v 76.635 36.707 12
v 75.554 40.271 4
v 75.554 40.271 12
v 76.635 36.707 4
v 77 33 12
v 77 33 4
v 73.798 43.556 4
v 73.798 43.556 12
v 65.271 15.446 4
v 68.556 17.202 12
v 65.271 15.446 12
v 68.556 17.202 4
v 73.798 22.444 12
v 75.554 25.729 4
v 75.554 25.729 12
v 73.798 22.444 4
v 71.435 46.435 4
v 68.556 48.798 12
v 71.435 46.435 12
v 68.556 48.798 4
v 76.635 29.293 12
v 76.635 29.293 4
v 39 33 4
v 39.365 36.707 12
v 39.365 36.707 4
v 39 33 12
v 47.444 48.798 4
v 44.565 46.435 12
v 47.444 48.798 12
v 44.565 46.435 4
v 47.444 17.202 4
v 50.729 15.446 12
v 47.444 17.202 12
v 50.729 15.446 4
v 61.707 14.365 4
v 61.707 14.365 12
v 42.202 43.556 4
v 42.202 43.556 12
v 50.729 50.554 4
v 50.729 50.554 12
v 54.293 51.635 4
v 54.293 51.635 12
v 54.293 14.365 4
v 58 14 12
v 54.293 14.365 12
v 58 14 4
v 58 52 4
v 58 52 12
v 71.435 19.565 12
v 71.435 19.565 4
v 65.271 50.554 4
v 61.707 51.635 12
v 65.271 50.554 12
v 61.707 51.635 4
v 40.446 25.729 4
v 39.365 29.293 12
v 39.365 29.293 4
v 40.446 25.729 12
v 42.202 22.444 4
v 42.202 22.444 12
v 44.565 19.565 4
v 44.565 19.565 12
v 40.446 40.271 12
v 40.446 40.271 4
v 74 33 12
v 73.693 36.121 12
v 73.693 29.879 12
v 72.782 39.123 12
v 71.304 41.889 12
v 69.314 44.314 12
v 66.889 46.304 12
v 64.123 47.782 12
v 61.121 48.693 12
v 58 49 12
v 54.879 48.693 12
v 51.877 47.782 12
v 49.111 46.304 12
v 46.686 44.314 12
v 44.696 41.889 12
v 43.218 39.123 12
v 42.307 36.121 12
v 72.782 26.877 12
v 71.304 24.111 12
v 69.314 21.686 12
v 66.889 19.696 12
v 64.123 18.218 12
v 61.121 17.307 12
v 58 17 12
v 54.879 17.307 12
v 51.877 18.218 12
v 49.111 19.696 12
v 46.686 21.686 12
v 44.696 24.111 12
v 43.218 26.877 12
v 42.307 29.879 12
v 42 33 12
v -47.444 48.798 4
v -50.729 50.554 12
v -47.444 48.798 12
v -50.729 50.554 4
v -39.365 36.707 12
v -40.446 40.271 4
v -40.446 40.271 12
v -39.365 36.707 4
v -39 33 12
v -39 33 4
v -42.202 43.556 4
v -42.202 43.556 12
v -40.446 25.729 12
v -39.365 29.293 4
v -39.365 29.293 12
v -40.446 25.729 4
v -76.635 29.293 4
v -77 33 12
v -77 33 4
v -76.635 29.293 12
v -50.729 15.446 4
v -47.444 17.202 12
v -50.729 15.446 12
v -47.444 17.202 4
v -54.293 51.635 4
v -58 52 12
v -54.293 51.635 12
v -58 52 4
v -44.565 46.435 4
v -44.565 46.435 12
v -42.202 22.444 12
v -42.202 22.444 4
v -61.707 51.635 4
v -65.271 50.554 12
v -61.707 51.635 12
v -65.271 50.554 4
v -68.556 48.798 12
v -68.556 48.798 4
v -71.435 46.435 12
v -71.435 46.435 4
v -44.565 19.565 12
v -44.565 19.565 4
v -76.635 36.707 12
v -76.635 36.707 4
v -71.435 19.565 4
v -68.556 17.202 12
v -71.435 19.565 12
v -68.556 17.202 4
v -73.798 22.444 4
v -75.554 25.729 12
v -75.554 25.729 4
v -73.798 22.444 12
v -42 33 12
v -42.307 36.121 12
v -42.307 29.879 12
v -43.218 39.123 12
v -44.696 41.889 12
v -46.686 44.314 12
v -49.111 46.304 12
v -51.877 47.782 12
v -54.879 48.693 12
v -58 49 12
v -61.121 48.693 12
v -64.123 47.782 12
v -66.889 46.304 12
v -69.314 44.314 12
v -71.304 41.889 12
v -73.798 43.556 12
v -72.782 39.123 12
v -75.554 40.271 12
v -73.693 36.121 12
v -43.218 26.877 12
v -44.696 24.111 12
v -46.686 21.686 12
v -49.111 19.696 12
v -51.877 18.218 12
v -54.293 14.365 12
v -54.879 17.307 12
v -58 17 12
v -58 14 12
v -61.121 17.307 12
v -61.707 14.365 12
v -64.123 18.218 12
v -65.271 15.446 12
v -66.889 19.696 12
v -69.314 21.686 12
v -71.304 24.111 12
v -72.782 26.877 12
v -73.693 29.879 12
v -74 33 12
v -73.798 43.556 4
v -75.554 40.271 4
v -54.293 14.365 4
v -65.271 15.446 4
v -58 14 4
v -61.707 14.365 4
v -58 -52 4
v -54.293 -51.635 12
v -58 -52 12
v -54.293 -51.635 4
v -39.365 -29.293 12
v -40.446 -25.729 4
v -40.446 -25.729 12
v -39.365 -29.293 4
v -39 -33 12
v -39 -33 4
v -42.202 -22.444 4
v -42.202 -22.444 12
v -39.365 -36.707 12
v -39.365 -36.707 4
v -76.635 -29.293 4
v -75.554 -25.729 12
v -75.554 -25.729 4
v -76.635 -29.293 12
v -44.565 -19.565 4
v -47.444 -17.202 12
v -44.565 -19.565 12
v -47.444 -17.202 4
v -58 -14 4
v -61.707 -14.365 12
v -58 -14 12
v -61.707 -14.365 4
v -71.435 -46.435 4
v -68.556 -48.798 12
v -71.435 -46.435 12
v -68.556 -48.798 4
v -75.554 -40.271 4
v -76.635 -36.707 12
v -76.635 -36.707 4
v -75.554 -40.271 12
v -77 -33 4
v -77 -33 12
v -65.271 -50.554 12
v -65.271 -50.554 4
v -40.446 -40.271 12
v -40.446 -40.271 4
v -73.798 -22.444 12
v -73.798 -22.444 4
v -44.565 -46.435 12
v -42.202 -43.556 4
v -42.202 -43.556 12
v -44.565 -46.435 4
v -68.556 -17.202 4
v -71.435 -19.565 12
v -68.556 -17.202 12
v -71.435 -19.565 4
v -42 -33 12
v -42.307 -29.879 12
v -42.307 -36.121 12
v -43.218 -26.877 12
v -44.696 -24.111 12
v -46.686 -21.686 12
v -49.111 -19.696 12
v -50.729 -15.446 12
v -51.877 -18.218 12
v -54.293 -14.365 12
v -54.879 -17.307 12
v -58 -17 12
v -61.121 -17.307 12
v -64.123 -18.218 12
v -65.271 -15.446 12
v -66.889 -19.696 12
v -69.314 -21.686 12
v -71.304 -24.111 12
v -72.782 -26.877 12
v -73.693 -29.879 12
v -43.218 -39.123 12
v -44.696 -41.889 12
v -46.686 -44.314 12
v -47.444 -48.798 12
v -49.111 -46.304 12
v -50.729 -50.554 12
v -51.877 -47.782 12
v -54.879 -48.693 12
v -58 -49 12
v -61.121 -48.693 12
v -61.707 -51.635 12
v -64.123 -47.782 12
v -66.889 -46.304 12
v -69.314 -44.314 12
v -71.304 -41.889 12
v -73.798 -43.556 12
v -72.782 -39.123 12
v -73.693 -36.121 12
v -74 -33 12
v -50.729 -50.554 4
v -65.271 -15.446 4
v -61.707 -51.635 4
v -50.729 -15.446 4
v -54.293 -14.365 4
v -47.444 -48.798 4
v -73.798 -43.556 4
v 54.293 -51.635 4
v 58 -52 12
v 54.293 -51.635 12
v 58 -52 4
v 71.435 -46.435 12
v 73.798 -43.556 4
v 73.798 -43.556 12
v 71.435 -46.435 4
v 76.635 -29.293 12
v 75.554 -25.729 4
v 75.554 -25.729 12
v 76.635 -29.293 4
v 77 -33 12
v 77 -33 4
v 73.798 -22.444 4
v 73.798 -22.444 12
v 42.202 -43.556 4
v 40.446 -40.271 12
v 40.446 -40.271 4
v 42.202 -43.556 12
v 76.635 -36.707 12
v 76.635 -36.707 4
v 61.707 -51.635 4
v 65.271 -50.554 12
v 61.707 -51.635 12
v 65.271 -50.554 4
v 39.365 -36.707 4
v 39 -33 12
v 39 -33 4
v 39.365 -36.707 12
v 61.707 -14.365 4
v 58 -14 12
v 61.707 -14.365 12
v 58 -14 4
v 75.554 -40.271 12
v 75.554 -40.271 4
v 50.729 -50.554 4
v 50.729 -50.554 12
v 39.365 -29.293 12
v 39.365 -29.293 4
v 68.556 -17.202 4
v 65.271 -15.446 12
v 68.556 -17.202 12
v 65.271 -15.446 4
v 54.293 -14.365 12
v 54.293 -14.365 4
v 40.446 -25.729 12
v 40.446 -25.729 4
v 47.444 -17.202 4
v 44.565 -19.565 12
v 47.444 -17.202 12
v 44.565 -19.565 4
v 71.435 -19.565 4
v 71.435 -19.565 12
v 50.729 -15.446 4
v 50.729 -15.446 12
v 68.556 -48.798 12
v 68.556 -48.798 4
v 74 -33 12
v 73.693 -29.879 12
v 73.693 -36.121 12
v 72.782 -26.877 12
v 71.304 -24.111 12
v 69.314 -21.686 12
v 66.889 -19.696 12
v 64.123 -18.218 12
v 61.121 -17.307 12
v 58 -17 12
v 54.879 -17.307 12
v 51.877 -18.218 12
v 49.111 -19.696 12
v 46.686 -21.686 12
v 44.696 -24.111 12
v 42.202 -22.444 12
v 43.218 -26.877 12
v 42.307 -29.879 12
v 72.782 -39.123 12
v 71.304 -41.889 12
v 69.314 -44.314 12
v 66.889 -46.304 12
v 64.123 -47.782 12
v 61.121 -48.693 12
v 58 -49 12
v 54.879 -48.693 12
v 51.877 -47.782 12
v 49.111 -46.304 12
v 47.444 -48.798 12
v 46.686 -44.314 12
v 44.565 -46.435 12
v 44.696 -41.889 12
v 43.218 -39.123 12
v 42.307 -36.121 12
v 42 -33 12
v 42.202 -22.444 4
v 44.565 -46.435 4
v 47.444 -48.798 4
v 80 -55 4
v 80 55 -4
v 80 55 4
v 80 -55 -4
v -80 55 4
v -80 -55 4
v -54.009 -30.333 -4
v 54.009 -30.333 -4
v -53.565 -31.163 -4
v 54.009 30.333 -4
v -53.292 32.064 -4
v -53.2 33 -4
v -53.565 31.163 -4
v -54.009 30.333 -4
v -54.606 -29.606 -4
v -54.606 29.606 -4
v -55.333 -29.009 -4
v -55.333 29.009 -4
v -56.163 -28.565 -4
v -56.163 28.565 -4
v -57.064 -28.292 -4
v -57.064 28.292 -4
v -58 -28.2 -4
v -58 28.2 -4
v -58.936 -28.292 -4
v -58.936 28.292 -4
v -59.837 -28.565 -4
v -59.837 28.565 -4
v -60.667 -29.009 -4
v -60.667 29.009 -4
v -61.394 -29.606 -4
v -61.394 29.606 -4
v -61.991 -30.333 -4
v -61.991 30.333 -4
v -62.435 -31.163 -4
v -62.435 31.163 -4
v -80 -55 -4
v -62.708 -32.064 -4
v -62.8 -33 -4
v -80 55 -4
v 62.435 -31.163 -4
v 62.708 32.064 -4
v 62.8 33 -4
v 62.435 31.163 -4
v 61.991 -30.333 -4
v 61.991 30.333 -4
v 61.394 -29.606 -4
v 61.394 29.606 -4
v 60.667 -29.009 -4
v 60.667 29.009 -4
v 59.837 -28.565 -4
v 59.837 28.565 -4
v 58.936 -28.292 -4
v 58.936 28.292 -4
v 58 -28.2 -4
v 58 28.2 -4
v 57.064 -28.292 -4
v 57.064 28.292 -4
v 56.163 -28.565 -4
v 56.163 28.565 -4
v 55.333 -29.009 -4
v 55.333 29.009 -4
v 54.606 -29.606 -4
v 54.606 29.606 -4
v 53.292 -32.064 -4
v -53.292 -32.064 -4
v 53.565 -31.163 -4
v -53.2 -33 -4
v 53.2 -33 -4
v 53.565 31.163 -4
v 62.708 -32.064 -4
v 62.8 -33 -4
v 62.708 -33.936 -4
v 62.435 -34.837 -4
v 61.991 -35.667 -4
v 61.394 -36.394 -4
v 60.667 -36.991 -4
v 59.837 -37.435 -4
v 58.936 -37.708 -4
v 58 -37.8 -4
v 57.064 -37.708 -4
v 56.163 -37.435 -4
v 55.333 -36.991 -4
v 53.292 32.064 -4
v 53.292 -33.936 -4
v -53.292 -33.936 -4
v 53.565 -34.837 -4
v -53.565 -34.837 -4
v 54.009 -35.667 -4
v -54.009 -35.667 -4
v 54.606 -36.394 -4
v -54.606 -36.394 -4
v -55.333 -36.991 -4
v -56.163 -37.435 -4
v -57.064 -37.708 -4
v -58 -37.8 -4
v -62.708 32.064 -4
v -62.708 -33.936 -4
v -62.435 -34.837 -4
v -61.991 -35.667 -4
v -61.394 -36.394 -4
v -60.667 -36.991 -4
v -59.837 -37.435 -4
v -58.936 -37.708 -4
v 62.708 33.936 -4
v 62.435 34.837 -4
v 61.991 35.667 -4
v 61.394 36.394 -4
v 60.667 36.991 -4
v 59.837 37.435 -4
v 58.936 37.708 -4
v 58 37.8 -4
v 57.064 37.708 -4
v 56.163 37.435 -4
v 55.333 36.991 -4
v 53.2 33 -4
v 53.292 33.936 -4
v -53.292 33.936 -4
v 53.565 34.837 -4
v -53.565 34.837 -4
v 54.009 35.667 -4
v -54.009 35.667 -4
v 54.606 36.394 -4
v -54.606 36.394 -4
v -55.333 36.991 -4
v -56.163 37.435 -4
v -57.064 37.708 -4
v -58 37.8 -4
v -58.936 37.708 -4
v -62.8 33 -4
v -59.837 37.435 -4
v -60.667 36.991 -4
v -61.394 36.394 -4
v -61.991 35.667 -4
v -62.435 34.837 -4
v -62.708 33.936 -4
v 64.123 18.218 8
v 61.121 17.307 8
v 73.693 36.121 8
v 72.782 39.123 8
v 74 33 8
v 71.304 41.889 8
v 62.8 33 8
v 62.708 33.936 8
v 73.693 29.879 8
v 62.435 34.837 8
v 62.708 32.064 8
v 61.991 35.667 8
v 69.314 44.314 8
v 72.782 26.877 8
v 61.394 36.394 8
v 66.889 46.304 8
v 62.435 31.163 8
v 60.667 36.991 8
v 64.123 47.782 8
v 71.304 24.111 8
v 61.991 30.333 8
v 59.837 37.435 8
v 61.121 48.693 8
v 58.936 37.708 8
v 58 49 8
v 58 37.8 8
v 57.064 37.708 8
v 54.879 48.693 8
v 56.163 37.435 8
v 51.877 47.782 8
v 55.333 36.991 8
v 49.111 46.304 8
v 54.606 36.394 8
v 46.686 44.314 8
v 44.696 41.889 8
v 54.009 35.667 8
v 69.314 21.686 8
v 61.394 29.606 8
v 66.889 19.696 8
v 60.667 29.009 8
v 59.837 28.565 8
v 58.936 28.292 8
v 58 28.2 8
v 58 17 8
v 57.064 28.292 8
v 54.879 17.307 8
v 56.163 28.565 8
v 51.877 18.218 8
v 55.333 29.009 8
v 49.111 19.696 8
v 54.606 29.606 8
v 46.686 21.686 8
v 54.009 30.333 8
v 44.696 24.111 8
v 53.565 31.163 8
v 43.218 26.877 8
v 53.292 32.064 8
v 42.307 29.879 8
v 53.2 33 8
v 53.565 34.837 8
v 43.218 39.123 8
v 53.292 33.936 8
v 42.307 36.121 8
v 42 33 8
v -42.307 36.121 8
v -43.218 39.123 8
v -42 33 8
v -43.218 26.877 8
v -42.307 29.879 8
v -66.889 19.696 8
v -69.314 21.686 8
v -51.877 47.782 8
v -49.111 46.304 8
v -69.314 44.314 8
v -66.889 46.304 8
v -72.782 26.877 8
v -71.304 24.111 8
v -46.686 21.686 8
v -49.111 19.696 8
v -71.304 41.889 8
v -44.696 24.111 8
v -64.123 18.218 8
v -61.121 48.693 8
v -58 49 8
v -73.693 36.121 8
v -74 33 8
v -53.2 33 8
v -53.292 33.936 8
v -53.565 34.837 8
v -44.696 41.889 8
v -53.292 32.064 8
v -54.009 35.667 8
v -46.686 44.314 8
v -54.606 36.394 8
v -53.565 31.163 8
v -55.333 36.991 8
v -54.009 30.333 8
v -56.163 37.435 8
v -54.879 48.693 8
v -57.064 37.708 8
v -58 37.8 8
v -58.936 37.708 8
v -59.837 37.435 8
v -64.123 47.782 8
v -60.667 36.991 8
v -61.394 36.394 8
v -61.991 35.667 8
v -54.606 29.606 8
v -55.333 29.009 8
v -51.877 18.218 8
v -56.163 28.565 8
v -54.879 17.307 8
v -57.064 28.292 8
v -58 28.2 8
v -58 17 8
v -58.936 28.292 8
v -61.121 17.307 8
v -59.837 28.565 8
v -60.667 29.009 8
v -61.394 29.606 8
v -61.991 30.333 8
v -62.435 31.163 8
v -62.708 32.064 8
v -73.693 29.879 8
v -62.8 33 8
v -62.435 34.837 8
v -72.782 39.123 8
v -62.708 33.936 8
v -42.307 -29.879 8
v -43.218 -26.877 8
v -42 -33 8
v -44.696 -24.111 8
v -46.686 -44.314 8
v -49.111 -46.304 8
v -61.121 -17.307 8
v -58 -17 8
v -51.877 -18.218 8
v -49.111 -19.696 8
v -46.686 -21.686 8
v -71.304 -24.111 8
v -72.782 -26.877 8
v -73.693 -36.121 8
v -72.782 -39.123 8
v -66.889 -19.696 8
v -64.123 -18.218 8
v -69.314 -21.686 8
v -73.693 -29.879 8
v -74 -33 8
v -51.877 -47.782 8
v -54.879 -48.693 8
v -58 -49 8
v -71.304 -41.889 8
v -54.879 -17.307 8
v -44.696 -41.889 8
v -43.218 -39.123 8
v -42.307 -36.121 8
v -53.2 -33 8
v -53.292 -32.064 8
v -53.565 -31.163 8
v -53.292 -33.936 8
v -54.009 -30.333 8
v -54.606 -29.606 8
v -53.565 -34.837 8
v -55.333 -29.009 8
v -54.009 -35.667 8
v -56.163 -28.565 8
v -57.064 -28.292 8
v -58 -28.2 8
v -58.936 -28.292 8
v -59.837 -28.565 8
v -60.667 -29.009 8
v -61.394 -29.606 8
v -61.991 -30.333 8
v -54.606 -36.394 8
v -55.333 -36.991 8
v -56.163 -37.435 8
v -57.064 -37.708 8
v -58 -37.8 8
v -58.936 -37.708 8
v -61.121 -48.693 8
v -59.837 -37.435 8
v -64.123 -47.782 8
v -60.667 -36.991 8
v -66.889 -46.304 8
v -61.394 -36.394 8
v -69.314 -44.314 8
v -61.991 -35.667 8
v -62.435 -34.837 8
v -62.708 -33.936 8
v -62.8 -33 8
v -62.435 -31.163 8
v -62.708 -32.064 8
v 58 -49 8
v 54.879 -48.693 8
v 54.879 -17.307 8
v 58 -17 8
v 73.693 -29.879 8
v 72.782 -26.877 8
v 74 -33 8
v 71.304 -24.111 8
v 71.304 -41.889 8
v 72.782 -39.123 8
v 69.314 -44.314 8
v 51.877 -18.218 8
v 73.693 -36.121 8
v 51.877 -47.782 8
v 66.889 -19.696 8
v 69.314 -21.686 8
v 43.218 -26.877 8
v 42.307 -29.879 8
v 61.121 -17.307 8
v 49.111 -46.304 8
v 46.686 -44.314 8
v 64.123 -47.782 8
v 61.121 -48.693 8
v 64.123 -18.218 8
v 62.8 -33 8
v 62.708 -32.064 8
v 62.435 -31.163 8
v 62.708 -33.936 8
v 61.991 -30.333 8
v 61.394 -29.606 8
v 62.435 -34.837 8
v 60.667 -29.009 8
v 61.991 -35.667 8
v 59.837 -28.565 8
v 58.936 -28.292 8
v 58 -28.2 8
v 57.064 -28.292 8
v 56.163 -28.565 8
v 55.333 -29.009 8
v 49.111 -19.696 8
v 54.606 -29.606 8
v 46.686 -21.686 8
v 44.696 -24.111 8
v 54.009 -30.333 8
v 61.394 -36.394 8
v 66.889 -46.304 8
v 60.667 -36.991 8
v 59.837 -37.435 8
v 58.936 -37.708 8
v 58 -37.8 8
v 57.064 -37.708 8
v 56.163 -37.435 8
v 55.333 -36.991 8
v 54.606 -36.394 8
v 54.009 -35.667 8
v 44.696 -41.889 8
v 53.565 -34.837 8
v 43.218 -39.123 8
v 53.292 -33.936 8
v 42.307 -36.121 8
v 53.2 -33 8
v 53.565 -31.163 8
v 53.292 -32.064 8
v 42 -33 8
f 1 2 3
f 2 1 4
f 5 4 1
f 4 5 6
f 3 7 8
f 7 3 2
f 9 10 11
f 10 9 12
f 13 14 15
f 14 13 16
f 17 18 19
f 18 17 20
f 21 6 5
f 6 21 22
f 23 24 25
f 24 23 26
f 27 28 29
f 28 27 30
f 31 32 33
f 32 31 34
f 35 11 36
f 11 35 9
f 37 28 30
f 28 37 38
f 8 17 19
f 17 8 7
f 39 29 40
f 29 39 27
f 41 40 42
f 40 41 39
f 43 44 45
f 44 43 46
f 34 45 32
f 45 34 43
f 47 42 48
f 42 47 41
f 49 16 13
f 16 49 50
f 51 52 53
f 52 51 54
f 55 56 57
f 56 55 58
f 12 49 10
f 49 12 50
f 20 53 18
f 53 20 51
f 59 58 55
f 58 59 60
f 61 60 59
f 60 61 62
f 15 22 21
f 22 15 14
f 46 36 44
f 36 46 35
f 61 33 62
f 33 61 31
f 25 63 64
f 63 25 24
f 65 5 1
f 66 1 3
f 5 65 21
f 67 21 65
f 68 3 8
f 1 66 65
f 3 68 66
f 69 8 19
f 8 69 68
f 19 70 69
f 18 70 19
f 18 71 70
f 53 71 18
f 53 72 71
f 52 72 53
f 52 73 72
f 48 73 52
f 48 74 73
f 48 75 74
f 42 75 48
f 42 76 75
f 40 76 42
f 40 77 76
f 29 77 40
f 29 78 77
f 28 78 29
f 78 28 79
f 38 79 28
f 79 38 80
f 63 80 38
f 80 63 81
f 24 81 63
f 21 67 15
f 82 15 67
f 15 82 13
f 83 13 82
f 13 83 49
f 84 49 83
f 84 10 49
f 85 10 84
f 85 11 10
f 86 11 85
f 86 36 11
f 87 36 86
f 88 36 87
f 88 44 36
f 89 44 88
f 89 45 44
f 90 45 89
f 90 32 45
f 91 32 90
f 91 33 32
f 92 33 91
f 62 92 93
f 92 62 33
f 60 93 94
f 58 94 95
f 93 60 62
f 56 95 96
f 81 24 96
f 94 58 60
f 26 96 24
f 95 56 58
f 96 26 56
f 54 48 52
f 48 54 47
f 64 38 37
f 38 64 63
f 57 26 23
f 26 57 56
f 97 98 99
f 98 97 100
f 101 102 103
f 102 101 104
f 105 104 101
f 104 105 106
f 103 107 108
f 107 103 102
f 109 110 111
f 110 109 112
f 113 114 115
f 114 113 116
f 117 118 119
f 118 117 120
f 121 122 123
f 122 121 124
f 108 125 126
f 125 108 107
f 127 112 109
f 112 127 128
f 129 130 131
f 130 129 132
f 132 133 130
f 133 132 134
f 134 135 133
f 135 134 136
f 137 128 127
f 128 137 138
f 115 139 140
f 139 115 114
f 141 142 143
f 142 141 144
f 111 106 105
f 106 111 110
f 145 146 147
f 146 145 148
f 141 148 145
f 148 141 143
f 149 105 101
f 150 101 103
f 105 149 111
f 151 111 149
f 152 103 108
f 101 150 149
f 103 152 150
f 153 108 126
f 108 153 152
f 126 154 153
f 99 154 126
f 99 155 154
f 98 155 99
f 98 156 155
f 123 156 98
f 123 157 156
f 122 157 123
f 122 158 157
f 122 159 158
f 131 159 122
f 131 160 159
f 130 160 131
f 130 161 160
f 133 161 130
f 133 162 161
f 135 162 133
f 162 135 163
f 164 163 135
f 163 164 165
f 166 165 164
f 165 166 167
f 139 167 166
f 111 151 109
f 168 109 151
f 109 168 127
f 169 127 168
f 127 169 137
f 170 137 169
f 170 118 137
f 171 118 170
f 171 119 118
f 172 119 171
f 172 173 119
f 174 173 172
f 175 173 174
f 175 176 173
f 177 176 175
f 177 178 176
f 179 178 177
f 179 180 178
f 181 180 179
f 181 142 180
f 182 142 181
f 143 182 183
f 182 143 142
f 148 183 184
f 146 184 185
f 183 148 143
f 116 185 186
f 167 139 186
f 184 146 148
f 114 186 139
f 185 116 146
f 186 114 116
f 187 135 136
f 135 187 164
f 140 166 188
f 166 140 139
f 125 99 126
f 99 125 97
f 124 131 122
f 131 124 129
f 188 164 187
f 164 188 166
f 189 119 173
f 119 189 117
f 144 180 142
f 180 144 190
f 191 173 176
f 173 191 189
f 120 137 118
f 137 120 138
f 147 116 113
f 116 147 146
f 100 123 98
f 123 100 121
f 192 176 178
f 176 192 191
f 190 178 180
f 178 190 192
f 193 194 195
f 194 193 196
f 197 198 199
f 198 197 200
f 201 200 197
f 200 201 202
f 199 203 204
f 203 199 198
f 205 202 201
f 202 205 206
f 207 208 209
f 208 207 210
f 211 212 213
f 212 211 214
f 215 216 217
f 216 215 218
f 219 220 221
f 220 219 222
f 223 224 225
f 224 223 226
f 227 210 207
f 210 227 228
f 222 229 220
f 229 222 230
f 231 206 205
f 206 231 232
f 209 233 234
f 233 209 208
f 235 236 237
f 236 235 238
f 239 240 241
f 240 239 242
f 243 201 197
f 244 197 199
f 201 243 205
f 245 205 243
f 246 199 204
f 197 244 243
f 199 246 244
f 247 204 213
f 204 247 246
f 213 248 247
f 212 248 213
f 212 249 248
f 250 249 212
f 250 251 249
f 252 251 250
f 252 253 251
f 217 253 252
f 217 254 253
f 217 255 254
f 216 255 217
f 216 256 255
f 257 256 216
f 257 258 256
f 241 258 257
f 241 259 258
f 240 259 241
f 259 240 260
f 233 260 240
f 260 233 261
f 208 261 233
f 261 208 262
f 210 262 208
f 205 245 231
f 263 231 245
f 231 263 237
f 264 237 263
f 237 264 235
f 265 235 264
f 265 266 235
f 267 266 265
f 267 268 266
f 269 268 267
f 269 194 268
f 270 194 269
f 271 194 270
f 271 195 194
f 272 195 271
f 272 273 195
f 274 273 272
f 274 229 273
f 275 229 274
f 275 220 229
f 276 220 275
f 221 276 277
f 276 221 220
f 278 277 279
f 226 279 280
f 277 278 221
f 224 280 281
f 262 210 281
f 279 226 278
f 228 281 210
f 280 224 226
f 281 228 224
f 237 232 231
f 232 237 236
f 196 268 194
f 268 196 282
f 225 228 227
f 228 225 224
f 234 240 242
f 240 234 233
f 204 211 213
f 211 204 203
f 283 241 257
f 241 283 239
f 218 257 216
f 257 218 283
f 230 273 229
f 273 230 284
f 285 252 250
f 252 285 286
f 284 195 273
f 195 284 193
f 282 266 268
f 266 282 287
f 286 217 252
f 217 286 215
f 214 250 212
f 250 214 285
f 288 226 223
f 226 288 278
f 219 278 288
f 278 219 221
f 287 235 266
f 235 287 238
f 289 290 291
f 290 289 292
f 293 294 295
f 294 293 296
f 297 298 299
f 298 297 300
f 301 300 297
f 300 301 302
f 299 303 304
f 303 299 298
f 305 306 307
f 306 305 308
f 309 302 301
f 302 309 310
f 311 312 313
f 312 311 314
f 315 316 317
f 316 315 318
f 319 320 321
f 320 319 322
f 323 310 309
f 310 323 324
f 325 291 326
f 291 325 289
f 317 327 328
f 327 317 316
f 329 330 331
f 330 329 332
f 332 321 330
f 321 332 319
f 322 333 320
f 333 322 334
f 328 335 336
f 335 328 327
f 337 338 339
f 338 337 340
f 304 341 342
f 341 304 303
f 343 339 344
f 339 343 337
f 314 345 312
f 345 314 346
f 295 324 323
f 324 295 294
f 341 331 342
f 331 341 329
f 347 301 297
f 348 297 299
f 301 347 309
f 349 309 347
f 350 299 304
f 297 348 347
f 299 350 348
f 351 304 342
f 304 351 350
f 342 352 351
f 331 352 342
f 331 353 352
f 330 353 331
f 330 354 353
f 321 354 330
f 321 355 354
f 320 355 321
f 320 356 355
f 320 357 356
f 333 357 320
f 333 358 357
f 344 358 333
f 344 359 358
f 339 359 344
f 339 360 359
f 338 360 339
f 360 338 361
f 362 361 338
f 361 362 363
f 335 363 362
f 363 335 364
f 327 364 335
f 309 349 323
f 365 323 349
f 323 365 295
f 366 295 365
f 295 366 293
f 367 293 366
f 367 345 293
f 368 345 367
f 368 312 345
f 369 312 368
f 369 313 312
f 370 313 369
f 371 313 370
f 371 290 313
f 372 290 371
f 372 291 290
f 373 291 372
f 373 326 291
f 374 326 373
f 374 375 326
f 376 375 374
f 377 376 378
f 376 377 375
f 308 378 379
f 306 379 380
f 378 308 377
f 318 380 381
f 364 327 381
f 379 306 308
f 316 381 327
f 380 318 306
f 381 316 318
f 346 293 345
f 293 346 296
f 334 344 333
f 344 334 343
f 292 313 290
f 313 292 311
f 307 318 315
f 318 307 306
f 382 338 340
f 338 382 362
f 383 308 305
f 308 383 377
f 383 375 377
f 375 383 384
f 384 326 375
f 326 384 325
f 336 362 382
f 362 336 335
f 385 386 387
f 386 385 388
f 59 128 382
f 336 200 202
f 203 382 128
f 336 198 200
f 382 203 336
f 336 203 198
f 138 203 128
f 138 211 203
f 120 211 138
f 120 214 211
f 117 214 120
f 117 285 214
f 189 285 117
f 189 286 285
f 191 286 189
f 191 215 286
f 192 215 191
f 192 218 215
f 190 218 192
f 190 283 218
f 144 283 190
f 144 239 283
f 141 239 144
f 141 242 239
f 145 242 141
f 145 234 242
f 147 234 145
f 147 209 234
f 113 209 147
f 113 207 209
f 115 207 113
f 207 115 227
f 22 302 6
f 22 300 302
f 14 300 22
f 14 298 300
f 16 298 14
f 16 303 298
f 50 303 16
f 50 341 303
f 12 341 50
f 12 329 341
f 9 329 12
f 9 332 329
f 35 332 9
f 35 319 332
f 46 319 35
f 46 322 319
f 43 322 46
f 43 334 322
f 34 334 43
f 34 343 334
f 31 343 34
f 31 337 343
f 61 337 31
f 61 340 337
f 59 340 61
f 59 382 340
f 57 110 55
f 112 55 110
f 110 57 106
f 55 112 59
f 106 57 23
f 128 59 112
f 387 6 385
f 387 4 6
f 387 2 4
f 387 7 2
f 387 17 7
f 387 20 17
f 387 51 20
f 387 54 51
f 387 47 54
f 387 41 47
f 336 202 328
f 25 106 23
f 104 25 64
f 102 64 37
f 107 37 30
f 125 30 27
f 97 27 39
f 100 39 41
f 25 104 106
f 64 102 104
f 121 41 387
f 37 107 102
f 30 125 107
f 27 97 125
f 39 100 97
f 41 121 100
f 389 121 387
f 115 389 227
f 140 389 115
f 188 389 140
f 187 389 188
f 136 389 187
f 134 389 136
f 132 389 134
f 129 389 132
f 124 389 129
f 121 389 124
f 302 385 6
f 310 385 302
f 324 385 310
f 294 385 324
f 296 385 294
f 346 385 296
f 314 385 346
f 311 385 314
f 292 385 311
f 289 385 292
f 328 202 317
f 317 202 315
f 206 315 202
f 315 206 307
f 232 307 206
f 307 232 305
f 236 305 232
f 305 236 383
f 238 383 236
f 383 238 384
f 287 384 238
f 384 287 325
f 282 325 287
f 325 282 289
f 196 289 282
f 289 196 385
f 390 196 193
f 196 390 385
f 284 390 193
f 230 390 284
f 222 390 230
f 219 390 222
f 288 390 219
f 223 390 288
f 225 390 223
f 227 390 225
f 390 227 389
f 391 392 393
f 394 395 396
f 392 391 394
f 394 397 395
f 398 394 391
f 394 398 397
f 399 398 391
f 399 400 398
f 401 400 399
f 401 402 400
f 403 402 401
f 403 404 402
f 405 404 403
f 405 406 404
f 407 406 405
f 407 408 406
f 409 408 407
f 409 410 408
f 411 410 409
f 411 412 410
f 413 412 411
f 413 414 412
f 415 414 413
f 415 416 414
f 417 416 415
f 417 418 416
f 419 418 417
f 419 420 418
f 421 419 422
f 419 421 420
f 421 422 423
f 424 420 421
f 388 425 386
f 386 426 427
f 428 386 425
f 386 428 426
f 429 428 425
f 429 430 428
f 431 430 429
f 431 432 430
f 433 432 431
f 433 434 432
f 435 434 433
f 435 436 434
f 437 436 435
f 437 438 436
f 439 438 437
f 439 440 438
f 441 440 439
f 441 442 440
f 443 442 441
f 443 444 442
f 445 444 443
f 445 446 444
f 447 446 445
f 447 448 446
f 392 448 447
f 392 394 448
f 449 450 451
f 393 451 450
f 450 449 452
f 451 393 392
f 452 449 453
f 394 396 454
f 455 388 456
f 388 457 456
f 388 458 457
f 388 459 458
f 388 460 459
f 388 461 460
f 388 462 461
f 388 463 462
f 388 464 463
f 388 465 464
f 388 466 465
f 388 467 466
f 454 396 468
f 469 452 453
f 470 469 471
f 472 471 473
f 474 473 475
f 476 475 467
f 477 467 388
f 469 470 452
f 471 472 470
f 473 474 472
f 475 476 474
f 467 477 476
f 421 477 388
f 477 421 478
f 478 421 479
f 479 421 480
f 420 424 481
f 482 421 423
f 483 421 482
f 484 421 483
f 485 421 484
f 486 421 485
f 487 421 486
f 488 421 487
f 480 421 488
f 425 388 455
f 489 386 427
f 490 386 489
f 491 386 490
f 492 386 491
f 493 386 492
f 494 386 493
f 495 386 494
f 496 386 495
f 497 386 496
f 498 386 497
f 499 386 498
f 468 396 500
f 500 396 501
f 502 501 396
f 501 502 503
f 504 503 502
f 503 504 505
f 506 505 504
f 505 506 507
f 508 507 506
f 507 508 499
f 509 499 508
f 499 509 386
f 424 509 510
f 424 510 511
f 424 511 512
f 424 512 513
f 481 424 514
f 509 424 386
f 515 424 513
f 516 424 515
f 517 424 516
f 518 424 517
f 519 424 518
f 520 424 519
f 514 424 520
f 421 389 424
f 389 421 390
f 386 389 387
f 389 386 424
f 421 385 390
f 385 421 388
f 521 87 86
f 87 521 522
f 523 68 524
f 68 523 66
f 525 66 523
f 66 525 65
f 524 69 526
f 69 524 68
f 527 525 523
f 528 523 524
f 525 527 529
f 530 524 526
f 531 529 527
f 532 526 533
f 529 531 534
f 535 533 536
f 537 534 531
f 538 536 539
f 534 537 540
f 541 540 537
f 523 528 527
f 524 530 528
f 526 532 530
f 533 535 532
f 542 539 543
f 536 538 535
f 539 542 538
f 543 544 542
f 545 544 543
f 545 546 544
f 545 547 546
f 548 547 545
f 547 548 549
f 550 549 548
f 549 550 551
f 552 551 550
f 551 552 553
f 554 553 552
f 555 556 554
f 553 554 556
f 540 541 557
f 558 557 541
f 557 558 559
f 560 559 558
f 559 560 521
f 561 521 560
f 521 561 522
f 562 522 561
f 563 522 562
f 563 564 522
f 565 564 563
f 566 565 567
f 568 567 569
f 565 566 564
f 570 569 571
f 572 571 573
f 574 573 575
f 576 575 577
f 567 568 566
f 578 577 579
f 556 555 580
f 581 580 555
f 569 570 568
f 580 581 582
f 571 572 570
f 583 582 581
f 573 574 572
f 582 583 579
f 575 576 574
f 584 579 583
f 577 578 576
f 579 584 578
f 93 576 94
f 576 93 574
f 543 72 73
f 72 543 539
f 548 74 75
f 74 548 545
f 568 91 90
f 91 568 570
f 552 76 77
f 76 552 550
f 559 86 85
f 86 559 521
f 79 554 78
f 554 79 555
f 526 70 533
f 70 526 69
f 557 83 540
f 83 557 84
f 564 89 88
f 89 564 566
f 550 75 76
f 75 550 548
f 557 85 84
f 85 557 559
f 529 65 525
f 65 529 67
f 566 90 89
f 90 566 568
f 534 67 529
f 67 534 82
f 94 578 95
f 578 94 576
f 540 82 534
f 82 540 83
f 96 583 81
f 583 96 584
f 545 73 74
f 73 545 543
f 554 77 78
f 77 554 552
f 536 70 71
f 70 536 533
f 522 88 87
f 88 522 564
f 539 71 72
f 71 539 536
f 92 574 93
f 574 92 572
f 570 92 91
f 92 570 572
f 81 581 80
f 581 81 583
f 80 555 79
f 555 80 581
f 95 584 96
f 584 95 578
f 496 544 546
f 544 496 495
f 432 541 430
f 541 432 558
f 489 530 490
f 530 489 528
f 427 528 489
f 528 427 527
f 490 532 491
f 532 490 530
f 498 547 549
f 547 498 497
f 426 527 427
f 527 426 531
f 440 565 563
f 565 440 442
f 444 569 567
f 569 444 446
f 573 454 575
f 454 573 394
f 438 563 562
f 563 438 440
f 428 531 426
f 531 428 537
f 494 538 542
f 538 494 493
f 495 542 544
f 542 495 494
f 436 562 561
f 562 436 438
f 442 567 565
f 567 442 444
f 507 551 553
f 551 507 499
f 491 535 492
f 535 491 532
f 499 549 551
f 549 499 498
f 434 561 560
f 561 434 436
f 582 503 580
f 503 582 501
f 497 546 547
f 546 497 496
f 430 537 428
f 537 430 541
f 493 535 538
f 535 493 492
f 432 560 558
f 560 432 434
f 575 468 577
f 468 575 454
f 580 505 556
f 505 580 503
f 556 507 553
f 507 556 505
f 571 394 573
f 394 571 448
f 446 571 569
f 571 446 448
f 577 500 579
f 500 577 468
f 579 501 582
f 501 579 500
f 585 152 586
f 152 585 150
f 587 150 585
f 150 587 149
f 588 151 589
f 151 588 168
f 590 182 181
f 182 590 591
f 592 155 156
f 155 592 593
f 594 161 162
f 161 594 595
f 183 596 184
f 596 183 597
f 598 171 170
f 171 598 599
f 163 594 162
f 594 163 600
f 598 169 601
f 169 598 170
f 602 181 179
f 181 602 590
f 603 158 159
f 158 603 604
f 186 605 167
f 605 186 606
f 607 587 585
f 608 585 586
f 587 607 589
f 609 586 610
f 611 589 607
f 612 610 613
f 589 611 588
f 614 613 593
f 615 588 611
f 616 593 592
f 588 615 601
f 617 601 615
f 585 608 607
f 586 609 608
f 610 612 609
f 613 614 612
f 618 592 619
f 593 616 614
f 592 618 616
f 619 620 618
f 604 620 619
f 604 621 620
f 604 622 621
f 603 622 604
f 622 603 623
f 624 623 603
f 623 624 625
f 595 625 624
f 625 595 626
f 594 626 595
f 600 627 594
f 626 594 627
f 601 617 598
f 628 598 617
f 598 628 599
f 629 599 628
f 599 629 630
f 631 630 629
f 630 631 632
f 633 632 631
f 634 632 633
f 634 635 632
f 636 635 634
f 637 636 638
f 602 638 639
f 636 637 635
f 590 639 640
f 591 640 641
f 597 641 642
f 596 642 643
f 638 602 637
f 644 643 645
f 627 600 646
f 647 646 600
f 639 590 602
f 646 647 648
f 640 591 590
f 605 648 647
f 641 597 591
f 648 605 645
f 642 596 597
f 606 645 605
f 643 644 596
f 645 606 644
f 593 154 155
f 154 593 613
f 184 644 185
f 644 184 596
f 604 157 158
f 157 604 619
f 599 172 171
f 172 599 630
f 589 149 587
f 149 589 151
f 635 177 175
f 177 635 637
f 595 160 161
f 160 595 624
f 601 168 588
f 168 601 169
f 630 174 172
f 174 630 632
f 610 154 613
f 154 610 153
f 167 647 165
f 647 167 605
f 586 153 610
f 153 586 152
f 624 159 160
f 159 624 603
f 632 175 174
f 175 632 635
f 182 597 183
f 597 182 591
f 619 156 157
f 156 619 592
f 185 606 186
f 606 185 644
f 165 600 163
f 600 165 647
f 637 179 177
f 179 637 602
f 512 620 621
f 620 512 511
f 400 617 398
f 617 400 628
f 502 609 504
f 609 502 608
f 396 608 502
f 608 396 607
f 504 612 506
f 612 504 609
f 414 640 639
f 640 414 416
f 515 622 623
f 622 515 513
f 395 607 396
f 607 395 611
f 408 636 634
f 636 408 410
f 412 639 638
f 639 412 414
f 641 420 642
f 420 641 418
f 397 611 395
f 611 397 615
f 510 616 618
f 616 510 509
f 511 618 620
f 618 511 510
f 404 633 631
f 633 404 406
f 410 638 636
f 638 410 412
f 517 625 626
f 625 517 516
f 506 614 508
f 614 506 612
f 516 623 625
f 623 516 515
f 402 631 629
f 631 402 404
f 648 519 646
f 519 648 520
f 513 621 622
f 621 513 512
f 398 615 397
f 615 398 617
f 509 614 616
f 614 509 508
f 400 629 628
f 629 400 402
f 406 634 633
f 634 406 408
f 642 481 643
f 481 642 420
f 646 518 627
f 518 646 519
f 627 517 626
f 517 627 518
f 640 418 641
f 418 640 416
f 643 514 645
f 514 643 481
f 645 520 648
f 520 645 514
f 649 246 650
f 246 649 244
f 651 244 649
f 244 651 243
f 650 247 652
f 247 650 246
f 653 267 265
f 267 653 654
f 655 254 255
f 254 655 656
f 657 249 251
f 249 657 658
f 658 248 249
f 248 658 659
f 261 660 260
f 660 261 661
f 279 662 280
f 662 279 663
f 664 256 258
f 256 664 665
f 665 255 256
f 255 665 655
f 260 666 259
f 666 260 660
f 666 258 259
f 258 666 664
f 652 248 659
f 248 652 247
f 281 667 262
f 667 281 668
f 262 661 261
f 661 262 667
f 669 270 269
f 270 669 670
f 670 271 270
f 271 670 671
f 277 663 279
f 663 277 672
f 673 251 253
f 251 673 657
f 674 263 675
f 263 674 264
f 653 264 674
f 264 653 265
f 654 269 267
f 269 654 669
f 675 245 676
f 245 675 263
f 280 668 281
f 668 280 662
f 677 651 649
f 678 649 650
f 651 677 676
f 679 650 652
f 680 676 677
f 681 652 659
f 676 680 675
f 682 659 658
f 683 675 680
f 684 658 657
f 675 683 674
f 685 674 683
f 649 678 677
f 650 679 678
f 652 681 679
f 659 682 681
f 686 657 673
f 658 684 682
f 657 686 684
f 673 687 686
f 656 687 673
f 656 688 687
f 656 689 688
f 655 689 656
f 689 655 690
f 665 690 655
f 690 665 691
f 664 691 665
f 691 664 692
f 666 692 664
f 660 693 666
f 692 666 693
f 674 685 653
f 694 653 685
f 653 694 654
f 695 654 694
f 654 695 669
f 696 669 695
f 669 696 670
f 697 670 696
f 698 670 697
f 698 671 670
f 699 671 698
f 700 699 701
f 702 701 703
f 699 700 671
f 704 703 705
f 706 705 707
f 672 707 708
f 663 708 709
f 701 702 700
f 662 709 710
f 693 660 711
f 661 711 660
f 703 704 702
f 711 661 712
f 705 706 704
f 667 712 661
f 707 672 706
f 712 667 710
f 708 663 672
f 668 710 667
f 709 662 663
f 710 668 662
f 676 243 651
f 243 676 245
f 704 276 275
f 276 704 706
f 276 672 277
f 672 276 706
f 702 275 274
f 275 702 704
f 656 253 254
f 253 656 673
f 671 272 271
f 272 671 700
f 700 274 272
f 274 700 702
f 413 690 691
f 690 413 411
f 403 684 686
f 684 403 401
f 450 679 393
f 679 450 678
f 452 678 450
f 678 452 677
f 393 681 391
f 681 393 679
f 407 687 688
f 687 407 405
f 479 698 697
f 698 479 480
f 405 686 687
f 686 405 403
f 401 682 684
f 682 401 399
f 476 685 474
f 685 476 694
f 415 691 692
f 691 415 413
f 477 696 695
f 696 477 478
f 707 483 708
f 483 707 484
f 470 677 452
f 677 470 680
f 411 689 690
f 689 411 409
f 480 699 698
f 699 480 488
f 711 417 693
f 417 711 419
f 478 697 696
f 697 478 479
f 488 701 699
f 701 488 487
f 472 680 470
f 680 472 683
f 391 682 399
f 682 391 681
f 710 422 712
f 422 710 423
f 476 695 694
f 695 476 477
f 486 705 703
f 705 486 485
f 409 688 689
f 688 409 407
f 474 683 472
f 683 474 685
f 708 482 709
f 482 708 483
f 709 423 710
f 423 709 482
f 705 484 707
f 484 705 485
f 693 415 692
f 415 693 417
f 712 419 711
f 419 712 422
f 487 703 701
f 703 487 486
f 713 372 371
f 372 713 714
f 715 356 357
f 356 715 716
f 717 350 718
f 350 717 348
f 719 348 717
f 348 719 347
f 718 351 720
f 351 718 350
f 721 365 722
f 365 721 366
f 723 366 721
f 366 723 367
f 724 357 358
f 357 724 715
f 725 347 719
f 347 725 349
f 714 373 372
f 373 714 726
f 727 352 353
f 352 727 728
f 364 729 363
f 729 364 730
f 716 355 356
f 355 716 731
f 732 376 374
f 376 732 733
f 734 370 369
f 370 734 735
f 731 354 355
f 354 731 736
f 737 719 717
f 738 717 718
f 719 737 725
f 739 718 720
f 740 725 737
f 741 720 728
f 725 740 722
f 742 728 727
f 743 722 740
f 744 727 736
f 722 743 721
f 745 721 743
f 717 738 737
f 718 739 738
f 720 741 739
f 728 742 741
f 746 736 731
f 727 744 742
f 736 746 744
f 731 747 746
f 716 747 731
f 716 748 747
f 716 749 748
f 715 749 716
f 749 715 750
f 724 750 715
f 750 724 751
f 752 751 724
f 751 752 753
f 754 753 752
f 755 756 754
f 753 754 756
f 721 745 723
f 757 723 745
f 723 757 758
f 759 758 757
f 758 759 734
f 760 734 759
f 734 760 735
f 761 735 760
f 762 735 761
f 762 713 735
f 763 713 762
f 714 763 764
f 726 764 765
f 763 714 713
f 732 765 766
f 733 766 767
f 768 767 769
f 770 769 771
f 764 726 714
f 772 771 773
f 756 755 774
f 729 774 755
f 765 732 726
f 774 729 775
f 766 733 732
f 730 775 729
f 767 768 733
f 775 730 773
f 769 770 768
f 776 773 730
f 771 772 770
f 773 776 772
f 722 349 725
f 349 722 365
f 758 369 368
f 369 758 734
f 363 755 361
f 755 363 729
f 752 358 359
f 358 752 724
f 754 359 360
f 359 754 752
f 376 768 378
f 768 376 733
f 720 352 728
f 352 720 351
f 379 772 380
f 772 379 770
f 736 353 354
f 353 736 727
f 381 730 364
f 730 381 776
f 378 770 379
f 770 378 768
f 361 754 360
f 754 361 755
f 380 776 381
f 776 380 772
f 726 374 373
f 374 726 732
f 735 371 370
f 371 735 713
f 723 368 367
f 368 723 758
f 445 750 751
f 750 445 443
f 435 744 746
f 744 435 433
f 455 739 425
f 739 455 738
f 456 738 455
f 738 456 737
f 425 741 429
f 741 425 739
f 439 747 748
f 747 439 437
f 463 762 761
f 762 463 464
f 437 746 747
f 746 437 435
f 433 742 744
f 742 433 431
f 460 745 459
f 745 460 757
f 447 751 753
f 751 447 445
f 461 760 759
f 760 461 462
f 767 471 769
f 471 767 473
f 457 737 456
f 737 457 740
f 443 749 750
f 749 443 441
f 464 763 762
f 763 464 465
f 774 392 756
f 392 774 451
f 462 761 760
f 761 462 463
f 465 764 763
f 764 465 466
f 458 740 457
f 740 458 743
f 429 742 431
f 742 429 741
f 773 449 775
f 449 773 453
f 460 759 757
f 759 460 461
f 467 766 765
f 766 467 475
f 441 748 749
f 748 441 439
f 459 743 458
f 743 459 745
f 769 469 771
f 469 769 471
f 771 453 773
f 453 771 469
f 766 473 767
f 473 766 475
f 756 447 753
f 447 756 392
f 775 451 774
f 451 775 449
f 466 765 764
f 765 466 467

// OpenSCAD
$fn = 32;

// ----------------------------------------------------------------------
// Socket pad plate
// bosses with counterbored sockets for the screws
// ----------------------------------------------------------------------

// --- parameters (mm) ---
base_t = 8;             // base plate thickness
boss_h = 8;             // boss height above the base plate
boss_d = 38;            // boss diameter
socket_d = 32;          // socket diameter
socket_depth = 4;       // socket depth from the boss face
bolt_d = 9.6;           // screw clearance hole through the socket floor
plate = [160, 110, 8];  // overall size (x, y, z)
edge = 22;              // boss centre offset from the plate edge
pads = 4;               // boss count, one per corner

// --- derived feature positions (mm) ---
height = base_t + boss_h;        // = 16   overall height of the part
corner_x = plate[0] / 2 - edge;  // = 58   boss centre X
corner_y = plate[1] / 2 - edge;  // = 33   boss centre Y
feature_centers = [
  [corner_x, corner_y],
  [-corner_x, corner_y],
  [-corner_x, -corner_y],
  [corner_x, -corner_y]
];   // boss centres: sockets, holes and the pads themselves are placed from here

// base plate, bosses on feature_centers, socket + through hole in each
difference() {
  union() {
    cube(plate, center = true);
    for (centre = feature_centers)
      translate([centre[0], centre[1], plate[2] / 2 - 1])
        cylinder(d = boss_d, h = boss_h + 1);
  }
  for (centre = feature_centers) {
    translate([centre[0], centre[1], plate[2] / 2 + boss_h - socket_depth])
      cylinder(d = socket_d, h = socket_depth + 1);
    translate([centre[0], centre[1], -height])
      cylinder(d = bolt_d, h = 2 * height + 2);  // through the socket floor
  }
}
